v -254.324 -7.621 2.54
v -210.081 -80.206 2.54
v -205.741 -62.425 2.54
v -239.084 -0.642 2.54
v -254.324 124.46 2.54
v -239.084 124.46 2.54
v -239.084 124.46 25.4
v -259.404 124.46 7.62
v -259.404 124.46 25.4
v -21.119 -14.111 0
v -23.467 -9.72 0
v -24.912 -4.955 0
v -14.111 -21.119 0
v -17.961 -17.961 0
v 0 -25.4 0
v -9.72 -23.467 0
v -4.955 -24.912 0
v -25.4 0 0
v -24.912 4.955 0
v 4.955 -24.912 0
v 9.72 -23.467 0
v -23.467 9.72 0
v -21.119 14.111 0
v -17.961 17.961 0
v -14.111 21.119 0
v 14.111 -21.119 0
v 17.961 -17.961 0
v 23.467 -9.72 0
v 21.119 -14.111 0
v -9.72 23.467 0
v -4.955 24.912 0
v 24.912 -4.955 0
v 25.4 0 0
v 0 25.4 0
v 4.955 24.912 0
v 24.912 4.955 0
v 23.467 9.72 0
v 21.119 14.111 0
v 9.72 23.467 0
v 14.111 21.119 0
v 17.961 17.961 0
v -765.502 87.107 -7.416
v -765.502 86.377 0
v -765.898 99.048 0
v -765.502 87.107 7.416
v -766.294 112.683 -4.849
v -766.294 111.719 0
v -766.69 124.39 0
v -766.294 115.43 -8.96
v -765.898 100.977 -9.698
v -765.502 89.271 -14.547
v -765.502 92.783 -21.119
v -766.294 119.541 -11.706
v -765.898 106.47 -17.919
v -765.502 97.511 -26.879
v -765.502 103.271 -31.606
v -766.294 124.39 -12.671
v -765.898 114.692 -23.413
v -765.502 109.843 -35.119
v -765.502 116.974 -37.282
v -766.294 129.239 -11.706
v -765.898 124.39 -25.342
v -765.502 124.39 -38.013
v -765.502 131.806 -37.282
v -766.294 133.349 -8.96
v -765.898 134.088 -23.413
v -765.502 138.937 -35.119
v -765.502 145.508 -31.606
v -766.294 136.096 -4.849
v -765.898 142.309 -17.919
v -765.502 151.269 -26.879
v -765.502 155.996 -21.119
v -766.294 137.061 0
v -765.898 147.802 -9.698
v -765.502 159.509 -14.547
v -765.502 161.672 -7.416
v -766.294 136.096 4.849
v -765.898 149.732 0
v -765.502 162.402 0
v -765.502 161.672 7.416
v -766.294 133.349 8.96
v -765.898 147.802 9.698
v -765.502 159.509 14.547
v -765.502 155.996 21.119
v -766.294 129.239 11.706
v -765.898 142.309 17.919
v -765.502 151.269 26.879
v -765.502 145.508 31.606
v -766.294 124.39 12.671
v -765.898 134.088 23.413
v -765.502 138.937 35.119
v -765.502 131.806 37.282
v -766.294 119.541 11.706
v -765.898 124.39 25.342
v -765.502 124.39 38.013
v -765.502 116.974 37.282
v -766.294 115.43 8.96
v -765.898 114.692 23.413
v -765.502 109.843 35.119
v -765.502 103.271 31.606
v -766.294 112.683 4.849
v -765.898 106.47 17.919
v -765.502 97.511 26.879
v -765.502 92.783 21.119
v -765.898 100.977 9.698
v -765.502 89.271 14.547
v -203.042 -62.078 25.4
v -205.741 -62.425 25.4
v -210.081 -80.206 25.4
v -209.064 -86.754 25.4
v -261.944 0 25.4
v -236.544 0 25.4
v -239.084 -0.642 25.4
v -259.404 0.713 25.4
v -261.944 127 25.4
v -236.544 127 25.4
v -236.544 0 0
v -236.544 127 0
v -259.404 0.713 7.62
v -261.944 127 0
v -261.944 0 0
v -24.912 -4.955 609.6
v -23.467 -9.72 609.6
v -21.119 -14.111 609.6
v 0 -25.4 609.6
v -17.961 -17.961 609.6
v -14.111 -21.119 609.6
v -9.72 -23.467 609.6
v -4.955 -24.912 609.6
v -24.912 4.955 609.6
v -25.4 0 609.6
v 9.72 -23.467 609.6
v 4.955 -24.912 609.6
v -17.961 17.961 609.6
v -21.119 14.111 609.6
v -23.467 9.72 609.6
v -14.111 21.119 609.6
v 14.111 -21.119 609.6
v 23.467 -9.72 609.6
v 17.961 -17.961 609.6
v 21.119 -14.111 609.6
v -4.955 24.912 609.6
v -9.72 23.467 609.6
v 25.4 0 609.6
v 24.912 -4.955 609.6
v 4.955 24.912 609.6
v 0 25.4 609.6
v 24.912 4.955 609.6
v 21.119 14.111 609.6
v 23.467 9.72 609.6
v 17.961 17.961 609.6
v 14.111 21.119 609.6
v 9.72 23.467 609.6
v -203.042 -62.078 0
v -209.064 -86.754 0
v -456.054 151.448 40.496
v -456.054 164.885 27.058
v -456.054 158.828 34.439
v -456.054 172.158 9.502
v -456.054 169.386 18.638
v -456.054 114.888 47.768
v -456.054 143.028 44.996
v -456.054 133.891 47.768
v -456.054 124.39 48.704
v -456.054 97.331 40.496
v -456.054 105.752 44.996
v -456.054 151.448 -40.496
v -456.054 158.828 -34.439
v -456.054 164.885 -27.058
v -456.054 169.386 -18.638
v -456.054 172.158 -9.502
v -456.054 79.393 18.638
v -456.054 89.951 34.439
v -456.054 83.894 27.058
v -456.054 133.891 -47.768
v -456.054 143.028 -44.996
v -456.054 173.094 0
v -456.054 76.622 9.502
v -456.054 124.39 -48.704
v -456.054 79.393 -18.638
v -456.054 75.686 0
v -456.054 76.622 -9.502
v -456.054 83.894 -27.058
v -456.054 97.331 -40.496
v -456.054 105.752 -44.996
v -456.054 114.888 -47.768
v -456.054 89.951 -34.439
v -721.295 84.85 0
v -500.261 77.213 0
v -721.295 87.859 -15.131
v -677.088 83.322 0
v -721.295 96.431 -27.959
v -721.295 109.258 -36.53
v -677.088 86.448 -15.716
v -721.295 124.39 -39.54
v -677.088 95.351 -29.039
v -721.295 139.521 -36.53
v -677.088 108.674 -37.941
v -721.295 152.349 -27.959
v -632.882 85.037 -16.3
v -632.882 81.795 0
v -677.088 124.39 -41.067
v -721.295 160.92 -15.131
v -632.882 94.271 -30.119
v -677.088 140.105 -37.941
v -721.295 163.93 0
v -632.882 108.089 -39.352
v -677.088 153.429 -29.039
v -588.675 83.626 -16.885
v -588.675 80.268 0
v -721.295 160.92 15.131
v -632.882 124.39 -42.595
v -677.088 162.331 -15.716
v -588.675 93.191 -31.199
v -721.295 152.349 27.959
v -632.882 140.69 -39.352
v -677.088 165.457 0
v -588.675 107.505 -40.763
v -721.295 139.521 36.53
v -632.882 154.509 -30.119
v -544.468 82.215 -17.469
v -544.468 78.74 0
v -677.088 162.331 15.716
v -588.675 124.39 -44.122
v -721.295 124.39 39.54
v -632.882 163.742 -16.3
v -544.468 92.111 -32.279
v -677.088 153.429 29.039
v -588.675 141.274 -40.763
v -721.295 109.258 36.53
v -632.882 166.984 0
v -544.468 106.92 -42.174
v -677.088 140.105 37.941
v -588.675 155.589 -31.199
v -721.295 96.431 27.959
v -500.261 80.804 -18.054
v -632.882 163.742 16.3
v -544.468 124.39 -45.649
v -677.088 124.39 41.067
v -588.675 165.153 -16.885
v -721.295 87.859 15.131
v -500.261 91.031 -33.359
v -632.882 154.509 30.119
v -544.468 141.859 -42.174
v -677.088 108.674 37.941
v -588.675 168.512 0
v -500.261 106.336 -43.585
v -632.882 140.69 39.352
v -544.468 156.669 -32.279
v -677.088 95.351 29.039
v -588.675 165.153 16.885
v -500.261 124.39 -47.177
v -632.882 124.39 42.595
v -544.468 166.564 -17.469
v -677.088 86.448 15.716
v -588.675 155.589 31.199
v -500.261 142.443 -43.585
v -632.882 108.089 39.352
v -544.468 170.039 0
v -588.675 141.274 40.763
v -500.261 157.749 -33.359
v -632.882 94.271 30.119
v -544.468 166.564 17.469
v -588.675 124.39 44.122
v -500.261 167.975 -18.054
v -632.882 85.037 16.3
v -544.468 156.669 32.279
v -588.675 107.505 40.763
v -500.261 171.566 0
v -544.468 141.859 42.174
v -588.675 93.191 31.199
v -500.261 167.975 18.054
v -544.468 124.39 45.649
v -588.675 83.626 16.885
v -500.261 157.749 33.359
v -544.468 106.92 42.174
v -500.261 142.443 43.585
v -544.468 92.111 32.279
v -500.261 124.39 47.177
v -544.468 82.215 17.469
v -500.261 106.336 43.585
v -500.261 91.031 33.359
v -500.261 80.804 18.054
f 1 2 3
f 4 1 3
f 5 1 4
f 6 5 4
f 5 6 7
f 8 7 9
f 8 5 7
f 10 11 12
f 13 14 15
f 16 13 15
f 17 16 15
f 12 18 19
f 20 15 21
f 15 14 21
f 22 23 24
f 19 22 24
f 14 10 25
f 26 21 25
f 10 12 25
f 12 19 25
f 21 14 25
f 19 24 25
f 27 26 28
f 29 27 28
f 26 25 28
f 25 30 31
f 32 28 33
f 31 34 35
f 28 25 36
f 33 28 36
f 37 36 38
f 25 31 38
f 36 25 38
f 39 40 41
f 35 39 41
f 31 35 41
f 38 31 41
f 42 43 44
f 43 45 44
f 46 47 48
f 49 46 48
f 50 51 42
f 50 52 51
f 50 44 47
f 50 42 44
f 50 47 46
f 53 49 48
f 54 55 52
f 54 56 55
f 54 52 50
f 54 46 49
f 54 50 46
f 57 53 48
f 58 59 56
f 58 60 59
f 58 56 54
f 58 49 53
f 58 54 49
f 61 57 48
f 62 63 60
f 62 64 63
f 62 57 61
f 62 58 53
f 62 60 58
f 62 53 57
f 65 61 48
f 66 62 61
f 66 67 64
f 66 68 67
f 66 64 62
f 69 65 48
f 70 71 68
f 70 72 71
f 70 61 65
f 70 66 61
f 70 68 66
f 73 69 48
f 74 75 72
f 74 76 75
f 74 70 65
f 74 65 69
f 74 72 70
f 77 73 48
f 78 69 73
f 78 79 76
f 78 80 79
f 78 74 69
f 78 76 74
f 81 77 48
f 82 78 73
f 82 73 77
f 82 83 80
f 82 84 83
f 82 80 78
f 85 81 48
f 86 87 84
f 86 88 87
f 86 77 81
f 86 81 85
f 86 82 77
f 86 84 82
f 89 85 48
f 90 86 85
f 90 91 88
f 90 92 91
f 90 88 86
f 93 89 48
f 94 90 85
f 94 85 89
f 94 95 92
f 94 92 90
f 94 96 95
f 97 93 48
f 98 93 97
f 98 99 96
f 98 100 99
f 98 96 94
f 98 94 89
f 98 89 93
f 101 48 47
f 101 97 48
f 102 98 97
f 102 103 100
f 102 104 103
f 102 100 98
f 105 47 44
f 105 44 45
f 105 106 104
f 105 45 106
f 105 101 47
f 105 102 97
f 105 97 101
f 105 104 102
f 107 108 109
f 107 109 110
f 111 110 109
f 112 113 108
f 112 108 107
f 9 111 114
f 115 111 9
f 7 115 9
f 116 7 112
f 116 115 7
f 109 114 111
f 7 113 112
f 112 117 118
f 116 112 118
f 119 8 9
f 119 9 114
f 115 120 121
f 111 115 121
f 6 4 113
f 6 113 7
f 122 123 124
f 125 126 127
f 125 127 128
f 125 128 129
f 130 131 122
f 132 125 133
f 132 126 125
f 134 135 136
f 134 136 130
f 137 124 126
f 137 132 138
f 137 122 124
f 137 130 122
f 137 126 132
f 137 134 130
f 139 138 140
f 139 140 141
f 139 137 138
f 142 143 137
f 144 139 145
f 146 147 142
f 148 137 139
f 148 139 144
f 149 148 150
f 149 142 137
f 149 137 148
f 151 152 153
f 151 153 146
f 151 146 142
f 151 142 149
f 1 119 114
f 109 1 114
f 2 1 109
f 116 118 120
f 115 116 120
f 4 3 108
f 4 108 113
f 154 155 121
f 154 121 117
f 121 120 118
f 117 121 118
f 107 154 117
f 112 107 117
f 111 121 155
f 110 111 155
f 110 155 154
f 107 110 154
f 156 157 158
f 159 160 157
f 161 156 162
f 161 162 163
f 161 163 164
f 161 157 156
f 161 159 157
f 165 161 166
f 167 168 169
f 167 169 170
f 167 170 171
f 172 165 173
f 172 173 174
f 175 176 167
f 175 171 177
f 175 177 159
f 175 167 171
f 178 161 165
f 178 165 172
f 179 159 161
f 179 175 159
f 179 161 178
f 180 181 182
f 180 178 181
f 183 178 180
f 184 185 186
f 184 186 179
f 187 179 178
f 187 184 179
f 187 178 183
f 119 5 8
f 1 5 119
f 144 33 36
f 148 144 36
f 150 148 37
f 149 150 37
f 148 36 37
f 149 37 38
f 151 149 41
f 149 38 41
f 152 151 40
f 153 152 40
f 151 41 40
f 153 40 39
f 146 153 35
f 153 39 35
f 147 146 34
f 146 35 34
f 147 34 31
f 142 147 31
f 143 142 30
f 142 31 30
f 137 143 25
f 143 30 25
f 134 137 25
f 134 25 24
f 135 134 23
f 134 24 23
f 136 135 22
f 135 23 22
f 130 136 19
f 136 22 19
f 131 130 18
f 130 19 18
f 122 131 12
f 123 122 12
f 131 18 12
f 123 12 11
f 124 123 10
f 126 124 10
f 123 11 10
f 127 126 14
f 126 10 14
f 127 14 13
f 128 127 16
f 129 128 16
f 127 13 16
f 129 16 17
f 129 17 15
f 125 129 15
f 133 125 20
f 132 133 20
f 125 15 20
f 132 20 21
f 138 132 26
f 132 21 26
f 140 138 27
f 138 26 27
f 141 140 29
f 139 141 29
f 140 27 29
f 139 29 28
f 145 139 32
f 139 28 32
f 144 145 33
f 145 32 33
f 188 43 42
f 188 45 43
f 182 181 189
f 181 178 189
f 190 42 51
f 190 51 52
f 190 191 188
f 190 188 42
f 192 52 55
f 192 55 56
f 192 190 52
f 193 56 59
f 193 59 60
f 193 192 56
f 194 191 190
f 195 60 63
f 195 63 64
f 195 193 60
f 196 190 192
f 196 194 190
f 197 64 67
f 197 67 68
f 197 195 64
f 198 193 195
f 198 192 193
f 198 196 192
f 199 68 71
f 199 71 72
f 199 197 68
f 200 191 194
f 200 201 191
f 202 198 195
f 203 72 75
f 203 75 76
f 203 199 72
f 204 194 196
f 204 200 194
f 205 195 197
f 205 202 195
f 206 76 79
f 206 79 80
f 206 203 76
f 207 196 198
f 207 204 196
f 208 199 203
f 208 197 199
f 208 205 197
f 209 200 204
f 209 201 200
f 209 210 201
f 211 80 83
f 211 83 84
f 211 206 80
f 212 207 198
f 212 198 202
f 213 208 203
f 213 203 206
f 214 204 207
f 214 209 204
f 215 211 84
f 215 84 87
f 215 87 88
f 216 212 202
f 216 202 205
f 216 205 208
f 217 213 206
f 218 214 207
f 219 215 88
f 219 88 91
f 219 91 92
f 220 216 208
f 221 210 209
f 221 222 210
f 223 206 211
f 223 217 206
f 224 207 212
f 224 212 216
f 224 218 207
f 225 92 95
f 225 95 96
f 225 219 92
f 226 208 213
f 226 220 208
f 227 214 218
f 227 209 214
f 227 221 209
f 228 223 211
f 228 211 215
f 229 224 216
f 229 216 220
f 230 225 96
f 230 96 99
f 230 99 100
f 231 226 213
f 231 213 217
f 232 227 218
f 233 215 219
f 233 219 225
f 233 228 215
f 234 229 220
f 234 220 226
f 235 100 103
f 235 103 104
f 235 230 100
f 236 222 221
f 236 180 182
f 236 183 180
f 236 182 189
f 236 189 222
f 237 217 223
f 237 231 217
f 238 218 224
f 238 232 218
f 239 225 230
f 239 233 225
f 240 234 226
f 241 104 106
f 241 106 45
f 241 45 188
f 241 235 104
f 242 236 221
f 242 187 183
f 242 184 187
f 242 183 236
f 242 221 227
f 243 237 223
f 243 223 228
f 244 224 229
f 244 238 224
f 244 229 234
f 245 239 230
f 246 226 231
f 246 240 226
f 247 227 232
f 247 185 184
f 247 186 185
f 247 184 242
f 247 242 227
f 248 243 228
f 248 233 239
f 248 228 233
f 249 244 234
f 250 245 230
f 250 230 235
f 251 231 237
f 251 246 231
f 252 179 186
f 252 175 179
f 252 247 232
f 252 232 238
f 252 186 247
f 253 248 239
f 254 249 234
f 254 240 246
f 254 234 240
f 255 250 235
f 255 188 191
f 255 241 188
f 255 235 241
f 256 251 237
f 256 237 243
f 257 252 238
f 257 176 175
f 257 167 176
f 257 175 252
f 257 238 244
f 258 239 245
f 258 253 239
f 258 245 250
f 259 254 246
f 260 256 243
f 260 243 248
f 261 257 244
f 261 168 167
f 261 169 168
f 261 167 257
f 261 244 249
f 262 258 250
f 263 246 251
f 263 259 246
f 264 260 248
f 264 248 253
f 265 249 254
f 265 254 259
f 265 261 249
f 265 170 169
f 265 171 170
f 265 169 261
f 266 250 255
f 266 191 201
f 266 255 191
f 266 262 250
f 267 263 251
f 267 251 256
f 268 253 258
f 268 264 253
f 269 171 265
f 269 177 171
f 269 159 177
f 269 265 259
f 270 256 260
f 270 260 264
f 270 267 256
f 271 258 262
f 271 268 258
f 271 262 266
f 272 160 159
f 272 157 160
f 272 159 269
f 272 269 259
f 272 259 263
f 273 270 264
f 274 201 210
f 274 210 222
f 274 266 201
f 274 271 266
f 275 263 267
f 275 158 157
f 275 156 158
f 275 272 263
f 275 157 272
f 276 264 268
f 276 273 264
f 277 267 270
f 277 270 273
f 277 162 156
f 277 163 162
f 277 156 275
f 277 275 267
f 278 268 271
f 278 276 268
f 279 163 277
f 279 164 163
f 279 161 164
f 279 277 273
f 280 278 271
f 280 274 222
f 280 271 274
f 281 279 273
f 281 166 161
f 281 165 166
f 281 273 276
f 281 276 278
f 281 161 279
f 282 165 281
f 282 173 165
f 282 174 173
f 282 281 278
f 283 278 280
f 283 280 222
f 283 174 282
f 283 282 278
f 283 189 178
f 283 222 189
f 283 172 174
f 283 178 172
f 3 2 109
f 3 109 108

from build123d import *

# Parameters (mm, degrees)
F0_R     = 25.4
F1_DEPTH = 609.6
F3_DEPTH = 25.4
F4_T     = -2.54
F5_SIZE  = 5.08


with BuildPart() as f1:
    # F0 (on Top) → F1 (new body)
    with BuildSketch(Plane.XY):
        Circle(F0_R)
    extrude(amount=F1_DEPTH)


with BuildPart() as f3:
    # F2 (on Top) → F3 (new body)
    with BuildSketch(Plane.XY):
        Polygon((-261.9443330295, 0), (-209.064377976, -86.7540797515), (-203.0420857811, -62.078342747), (-236.5443330295, 0), (-236.5443330295, 127), (-261.9443330295, 127), (-261.9443330295, 25.4), align=None)
    extrude(amount=F3_DEPTH)

    # F4
    f4_openings = [f3.faces().sort_by_distance(p)[0] for p in [
        (-242.226686, 29.058726, 25.4),
    ]]
    offset(amount=F4_T, openings=f4_openings, kind=Kind.INTERSECTION)

    # F5
    f5_edges = [f3.edges().sort_by_distance(p)[0] for p in [
        (-259.404333, 62.586549, 2.54),
    ]]
    chamfer(f5_edges, length=F5_SIZE)


with BuildPart() as f7:
    # F6 (on Top) → F7 (revolve)
    with BuildSketch(Plane.XY):
        Polygon((-456.0544639826, 124.389693141), (-766.6897177696, 124.389693141), (-765.5018568039, 86.3769650459), (-456.0544639826, 75.6858810782), align=None)
    revolve(axis=Axis((-611.3720908761, 124.389693141, 0), (1, 0, 0)))


solid = Compound([f1.part, f3.part, f7.part])
